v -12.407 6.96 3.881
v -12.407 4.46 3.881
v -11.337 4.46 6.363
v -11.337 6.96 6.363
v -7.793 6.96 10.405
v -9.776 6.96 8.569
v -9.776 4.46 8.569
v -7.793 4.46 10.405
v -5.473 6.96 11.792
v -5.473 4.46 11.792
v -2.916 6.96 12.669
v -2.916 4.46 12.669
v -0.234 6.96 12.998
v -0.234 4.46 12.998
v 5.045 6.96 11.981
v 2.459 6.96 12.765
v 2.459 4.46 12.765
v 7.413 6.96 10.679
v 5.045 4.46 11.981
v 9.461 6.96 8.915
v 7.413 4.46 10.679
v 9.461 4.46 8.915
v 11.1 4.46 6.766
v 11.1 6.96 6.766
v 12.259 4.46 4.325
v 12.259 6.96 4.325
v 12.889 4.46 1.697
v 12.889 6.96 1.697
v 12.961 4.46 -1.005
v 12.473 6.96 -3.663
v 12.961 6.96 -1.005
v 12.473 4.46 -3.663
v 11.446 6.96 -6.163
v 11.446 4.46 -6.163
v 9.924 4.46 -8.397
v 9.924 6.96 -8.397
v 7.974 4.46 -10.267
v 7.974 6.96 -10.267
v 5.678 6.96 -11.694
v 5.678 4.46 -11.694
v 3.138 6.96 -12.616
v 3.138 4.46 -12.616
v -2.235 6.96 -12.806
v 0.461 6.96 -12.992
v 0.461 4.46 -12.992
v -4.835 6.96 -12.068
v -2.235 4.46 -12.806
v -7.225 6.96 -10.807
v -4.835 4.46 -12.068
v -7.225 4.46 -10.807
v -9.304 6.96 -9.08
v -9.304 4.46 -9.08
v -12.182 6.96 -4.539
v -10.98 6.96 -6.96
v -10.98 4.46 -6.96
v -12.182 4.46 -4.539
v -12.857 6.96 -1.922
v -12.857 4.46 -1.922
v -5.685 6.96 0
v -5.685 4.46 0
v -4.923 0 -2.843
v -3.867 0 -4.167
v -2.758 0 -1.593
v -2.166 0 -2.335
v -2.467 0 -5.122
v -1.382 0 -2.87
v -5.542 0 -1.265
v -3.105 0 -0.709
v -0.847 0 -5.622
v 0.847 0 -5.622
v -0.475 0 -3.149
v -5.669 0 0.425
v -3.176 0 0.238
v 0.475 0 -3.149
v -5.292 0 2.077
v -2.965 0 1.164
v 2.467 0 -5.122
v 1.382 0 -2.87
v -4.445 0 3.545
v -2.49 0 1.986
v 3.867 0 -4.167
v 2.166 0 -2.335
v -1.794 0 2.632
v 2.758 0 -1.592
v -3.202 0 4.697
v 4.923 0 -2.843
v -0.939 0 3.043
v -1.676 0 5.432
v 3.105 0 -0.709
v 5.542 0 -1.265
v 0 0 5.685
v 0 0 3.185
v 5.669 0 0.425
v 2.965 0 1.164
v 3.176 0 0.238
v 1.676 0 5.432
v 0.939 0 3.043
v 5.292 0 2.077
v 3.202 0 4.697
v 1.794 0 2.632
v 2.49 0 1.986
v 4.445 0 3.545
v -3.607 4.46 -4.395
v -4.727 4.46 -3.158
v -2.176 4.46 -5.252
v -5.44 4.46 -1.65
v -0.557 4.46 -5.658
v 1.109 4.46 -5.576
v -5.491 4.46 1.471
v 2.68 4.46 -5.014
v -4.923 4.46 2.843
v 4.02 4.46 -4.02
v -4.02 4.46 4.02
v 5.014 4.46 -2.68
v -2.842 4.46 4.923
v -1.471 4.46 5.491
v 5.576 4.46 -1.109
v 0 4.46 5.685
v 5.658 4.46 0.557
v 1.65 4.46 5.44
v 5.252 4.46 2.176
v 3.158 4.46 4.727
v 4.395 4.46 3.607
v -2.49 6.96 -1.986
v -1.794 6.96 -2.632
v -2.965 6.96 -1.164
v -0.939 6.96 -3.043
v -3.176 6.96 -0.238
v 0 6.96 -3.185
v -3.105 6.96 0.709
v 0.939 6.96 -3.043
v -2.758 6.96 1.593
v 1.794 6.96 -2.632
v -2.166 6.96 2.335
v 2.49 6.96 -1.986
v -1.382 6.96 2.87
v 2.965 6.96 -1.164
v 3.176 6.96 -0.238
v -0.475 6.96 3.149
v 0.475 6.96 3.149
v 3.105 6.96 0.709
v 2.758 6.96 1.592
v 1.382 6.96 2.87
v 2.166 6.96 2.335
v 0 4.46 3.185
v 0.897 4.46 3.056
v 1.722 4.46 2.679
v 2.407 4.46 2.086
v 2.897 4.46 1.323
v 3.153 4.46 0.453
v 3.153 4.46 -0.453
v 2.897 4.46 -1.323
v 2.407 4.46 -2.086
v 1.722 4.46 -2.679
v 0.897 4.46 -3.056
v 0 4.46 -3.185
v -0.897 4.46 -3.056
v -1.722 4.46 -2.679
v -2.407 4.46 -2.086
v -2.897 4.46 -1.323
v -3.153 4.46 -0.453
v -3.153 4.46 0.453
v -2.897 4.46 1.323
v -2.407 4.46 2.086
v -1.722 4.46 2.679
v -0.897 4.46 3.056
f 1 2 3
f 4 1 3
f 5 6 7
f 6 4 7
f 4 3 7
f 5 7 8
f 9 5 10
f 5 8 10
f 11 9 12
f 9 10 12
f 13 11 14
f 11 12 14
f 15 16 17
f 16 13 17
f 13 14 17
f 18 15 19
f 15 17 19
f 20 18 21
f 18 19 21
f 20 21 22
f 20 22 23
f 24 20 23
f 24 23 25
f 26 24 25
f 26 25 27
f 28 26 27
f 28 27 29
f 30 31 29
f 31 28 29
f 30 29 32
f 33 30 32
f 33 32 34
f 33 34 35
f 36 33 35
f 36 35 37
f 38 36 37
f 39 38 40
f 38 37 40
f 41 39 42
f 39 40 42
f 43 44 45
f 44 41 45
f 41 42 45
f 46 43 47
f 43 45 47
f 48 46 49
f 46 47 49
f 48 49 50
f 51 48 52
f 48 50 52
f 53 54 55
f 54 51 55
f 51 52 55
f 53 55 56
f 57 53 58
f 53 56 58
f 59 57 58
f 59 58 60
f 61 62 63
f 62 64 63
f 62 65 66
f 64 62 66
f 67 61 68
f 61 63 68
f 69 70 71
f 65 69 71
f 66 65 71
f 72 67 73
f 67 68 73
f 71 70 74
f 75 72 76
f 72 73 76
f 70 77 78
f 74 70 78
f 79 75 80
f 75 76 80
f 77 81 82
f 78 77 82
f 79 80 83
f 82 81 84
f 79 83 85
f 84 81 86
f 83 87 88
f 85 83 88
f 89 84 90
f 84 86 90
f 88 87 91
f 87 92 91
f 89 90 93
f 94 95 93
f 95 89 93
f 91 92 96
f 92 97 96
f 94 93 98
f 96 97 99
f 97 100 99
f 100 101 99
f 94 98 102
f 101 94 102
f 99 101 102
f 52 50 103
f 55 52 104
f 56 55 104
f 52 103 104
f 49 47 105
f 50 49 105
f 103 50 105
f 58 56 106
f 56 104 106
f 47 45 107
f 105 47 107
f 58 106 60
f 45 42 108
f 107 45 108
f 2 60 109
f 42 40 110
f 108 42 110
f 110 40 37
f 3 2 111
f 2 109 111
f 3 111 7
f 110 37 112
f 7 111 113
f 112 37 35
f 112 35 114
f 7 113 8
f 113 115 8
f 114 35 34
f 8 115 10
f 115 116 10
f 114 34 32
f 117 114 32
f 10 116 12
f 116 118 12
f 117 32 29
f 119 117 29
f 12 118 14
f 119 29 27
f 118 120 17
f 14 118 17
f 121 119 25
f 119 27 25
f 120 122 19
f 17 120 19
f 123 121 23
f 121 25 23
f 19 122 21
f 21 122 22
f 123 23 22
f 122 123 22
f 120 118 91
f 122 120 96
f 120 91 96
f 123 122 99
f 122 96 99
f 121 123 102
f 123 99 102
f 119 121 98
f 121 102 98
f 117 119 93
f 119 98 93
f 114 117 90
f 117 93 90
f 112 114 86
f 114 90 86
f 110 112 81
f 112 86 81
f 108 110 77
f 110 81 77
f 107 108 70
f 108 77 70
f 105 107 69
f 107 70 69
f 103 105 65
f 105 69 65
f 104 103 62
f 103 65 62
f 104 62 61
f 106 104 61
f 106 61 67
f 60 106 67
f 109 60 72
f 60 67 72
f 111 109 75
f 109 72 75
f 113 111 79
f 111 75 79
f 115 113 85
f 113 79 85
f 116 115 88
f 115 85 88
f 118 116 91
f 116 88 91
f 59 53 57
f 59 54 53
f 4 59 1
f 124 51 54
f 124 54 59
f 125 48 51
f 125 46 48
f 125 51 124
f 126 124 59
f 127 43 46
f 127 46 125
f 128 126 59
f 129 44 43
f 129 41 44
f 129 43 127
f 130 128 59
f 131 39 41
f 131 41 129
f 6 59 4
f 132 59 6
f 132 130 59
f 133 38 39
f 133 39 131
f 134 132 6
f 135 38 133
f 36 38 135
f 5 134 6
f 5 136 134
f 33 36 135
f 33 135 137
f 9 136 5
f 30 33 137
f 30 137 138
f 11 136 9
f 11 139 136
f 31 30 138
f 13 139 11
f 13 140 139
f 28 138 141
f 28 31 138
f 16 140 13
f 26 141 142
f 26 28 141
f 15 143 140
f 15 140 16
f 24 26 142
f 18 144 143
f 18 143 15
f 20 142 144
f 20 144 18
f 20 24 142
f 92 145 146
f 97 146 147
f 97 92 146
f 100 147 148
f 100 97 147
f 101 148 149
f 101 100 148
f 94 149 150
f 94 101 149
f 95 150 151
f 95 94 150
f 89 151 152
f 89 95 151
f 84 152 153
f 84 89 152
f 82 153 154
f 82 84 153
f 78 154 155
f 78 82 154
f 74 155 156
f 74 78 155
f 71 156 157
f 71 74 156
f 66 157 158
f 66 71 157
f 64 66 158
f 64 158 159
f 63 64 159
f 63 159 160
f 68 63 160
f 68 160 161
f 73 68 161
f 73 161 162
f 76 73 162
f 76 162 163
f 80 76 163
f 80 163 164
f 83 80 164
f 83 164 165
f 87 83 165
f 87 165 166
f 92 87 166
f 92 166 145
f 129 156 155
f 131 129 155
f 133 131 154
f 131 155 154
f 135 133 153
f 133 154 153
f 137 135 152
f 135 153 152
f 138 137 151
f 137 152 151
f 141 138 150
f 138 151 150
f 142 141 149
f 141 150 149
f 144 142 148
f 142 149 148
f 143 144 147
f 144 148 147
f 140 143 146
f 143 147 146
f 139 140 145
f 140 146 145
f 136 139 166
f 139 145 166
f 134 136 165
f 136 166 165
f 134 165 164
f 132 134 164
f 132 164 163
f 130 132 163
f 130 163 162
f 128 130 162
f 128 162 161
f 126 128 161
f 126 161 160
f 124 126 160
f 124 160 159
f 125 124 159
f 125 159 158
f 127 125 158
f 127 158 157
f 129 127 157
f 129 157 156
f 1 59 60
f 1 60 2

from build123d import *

# Parameters (mm, degrees)
SKETCH1_R               = 5.685
SKETCH1_R_2             = 3.185
BOSS_EXTRUDE1_DEPTH     = 4.46
SKETCH2_R               = 13
BOSS_EXTRUDE2_DEPTH     = 2.5
SKETCH3_R               = 3.185
CUT_EXTRUDE1_DEPTH      = 2.5
CUT_EXTRUDE3_DEPTH      = 19.918023153
CUT_EXTRUDE3_DEPTH_BACK = 19.918023153


with BuildPart() as part:
    # Sketch1 → Boss-Extrude1 (new body)
    with BuildSketch(Plane(origin=(0, 0, 0), x_dir=(1, 0, 0), z_dir=(0, 1, 0))):
        with Locations(Location((0, 0, 0), (0, 0, 270))):
            Circle(SKETCH1_R)
        with Locations(Location((0, 0, 0), (0, 0, 270))):
            Circle(SKETCH1_R_2, mode=Mode.SUBTRACT)
    extrude(amount=BOSS_EXTRUDE1_DEPTH)

    # Sketch2 → Boss-Extrude2 (add)
    with BuildSketch(Plane(origin=(0, 4.46, 0), x_dir=(1, 0, 0), z_dir=(0, 1, 0))):
        with Locations(Location((0, 0, 0), (0, 0, 270))):
            Circle(SKETCH2_R)
    extrude(amount=BOSS_EXTRUDE2_DEPTH)

    # Sketch3 → Cut-Extrude1 (cut)
    with BuildSketch(Plane.XZ.offset(-4.46)):
        with Locations(Location((0, 0, 0), (0, 0, 270))):
            Circle(SKETCH3_R)
    extrude(amount=-CUT_EXTRUDE1_DEPTH, mode=Mode.SUBTRACT)

    # Sketch4 → Cut-Extrude3 (cut, two sides: drawn at the far end of the back side and taken through both)
    with BuildSketch(Plane.XZ.offset(-4.46).offset(-CUT_EXTRUDE3_DEPTH_BACK)):
        Polygon((-81.445599846, -20.299991547), (-12.85716821, -1.92177668), (-5.685, 0), (-12.407156668, 3.881038962), (-73.901862147, 39.385023724), (-214.796857137, 57.193092978), (-222.340594836, -2.491922293), align=None)
    extrude(amount=CUT_EXTRUDE3_DEPTH + CUT_EXTRUDE3_DEPTH_BACK, mode=Mode.SUBTRACT)


solid = part.part
